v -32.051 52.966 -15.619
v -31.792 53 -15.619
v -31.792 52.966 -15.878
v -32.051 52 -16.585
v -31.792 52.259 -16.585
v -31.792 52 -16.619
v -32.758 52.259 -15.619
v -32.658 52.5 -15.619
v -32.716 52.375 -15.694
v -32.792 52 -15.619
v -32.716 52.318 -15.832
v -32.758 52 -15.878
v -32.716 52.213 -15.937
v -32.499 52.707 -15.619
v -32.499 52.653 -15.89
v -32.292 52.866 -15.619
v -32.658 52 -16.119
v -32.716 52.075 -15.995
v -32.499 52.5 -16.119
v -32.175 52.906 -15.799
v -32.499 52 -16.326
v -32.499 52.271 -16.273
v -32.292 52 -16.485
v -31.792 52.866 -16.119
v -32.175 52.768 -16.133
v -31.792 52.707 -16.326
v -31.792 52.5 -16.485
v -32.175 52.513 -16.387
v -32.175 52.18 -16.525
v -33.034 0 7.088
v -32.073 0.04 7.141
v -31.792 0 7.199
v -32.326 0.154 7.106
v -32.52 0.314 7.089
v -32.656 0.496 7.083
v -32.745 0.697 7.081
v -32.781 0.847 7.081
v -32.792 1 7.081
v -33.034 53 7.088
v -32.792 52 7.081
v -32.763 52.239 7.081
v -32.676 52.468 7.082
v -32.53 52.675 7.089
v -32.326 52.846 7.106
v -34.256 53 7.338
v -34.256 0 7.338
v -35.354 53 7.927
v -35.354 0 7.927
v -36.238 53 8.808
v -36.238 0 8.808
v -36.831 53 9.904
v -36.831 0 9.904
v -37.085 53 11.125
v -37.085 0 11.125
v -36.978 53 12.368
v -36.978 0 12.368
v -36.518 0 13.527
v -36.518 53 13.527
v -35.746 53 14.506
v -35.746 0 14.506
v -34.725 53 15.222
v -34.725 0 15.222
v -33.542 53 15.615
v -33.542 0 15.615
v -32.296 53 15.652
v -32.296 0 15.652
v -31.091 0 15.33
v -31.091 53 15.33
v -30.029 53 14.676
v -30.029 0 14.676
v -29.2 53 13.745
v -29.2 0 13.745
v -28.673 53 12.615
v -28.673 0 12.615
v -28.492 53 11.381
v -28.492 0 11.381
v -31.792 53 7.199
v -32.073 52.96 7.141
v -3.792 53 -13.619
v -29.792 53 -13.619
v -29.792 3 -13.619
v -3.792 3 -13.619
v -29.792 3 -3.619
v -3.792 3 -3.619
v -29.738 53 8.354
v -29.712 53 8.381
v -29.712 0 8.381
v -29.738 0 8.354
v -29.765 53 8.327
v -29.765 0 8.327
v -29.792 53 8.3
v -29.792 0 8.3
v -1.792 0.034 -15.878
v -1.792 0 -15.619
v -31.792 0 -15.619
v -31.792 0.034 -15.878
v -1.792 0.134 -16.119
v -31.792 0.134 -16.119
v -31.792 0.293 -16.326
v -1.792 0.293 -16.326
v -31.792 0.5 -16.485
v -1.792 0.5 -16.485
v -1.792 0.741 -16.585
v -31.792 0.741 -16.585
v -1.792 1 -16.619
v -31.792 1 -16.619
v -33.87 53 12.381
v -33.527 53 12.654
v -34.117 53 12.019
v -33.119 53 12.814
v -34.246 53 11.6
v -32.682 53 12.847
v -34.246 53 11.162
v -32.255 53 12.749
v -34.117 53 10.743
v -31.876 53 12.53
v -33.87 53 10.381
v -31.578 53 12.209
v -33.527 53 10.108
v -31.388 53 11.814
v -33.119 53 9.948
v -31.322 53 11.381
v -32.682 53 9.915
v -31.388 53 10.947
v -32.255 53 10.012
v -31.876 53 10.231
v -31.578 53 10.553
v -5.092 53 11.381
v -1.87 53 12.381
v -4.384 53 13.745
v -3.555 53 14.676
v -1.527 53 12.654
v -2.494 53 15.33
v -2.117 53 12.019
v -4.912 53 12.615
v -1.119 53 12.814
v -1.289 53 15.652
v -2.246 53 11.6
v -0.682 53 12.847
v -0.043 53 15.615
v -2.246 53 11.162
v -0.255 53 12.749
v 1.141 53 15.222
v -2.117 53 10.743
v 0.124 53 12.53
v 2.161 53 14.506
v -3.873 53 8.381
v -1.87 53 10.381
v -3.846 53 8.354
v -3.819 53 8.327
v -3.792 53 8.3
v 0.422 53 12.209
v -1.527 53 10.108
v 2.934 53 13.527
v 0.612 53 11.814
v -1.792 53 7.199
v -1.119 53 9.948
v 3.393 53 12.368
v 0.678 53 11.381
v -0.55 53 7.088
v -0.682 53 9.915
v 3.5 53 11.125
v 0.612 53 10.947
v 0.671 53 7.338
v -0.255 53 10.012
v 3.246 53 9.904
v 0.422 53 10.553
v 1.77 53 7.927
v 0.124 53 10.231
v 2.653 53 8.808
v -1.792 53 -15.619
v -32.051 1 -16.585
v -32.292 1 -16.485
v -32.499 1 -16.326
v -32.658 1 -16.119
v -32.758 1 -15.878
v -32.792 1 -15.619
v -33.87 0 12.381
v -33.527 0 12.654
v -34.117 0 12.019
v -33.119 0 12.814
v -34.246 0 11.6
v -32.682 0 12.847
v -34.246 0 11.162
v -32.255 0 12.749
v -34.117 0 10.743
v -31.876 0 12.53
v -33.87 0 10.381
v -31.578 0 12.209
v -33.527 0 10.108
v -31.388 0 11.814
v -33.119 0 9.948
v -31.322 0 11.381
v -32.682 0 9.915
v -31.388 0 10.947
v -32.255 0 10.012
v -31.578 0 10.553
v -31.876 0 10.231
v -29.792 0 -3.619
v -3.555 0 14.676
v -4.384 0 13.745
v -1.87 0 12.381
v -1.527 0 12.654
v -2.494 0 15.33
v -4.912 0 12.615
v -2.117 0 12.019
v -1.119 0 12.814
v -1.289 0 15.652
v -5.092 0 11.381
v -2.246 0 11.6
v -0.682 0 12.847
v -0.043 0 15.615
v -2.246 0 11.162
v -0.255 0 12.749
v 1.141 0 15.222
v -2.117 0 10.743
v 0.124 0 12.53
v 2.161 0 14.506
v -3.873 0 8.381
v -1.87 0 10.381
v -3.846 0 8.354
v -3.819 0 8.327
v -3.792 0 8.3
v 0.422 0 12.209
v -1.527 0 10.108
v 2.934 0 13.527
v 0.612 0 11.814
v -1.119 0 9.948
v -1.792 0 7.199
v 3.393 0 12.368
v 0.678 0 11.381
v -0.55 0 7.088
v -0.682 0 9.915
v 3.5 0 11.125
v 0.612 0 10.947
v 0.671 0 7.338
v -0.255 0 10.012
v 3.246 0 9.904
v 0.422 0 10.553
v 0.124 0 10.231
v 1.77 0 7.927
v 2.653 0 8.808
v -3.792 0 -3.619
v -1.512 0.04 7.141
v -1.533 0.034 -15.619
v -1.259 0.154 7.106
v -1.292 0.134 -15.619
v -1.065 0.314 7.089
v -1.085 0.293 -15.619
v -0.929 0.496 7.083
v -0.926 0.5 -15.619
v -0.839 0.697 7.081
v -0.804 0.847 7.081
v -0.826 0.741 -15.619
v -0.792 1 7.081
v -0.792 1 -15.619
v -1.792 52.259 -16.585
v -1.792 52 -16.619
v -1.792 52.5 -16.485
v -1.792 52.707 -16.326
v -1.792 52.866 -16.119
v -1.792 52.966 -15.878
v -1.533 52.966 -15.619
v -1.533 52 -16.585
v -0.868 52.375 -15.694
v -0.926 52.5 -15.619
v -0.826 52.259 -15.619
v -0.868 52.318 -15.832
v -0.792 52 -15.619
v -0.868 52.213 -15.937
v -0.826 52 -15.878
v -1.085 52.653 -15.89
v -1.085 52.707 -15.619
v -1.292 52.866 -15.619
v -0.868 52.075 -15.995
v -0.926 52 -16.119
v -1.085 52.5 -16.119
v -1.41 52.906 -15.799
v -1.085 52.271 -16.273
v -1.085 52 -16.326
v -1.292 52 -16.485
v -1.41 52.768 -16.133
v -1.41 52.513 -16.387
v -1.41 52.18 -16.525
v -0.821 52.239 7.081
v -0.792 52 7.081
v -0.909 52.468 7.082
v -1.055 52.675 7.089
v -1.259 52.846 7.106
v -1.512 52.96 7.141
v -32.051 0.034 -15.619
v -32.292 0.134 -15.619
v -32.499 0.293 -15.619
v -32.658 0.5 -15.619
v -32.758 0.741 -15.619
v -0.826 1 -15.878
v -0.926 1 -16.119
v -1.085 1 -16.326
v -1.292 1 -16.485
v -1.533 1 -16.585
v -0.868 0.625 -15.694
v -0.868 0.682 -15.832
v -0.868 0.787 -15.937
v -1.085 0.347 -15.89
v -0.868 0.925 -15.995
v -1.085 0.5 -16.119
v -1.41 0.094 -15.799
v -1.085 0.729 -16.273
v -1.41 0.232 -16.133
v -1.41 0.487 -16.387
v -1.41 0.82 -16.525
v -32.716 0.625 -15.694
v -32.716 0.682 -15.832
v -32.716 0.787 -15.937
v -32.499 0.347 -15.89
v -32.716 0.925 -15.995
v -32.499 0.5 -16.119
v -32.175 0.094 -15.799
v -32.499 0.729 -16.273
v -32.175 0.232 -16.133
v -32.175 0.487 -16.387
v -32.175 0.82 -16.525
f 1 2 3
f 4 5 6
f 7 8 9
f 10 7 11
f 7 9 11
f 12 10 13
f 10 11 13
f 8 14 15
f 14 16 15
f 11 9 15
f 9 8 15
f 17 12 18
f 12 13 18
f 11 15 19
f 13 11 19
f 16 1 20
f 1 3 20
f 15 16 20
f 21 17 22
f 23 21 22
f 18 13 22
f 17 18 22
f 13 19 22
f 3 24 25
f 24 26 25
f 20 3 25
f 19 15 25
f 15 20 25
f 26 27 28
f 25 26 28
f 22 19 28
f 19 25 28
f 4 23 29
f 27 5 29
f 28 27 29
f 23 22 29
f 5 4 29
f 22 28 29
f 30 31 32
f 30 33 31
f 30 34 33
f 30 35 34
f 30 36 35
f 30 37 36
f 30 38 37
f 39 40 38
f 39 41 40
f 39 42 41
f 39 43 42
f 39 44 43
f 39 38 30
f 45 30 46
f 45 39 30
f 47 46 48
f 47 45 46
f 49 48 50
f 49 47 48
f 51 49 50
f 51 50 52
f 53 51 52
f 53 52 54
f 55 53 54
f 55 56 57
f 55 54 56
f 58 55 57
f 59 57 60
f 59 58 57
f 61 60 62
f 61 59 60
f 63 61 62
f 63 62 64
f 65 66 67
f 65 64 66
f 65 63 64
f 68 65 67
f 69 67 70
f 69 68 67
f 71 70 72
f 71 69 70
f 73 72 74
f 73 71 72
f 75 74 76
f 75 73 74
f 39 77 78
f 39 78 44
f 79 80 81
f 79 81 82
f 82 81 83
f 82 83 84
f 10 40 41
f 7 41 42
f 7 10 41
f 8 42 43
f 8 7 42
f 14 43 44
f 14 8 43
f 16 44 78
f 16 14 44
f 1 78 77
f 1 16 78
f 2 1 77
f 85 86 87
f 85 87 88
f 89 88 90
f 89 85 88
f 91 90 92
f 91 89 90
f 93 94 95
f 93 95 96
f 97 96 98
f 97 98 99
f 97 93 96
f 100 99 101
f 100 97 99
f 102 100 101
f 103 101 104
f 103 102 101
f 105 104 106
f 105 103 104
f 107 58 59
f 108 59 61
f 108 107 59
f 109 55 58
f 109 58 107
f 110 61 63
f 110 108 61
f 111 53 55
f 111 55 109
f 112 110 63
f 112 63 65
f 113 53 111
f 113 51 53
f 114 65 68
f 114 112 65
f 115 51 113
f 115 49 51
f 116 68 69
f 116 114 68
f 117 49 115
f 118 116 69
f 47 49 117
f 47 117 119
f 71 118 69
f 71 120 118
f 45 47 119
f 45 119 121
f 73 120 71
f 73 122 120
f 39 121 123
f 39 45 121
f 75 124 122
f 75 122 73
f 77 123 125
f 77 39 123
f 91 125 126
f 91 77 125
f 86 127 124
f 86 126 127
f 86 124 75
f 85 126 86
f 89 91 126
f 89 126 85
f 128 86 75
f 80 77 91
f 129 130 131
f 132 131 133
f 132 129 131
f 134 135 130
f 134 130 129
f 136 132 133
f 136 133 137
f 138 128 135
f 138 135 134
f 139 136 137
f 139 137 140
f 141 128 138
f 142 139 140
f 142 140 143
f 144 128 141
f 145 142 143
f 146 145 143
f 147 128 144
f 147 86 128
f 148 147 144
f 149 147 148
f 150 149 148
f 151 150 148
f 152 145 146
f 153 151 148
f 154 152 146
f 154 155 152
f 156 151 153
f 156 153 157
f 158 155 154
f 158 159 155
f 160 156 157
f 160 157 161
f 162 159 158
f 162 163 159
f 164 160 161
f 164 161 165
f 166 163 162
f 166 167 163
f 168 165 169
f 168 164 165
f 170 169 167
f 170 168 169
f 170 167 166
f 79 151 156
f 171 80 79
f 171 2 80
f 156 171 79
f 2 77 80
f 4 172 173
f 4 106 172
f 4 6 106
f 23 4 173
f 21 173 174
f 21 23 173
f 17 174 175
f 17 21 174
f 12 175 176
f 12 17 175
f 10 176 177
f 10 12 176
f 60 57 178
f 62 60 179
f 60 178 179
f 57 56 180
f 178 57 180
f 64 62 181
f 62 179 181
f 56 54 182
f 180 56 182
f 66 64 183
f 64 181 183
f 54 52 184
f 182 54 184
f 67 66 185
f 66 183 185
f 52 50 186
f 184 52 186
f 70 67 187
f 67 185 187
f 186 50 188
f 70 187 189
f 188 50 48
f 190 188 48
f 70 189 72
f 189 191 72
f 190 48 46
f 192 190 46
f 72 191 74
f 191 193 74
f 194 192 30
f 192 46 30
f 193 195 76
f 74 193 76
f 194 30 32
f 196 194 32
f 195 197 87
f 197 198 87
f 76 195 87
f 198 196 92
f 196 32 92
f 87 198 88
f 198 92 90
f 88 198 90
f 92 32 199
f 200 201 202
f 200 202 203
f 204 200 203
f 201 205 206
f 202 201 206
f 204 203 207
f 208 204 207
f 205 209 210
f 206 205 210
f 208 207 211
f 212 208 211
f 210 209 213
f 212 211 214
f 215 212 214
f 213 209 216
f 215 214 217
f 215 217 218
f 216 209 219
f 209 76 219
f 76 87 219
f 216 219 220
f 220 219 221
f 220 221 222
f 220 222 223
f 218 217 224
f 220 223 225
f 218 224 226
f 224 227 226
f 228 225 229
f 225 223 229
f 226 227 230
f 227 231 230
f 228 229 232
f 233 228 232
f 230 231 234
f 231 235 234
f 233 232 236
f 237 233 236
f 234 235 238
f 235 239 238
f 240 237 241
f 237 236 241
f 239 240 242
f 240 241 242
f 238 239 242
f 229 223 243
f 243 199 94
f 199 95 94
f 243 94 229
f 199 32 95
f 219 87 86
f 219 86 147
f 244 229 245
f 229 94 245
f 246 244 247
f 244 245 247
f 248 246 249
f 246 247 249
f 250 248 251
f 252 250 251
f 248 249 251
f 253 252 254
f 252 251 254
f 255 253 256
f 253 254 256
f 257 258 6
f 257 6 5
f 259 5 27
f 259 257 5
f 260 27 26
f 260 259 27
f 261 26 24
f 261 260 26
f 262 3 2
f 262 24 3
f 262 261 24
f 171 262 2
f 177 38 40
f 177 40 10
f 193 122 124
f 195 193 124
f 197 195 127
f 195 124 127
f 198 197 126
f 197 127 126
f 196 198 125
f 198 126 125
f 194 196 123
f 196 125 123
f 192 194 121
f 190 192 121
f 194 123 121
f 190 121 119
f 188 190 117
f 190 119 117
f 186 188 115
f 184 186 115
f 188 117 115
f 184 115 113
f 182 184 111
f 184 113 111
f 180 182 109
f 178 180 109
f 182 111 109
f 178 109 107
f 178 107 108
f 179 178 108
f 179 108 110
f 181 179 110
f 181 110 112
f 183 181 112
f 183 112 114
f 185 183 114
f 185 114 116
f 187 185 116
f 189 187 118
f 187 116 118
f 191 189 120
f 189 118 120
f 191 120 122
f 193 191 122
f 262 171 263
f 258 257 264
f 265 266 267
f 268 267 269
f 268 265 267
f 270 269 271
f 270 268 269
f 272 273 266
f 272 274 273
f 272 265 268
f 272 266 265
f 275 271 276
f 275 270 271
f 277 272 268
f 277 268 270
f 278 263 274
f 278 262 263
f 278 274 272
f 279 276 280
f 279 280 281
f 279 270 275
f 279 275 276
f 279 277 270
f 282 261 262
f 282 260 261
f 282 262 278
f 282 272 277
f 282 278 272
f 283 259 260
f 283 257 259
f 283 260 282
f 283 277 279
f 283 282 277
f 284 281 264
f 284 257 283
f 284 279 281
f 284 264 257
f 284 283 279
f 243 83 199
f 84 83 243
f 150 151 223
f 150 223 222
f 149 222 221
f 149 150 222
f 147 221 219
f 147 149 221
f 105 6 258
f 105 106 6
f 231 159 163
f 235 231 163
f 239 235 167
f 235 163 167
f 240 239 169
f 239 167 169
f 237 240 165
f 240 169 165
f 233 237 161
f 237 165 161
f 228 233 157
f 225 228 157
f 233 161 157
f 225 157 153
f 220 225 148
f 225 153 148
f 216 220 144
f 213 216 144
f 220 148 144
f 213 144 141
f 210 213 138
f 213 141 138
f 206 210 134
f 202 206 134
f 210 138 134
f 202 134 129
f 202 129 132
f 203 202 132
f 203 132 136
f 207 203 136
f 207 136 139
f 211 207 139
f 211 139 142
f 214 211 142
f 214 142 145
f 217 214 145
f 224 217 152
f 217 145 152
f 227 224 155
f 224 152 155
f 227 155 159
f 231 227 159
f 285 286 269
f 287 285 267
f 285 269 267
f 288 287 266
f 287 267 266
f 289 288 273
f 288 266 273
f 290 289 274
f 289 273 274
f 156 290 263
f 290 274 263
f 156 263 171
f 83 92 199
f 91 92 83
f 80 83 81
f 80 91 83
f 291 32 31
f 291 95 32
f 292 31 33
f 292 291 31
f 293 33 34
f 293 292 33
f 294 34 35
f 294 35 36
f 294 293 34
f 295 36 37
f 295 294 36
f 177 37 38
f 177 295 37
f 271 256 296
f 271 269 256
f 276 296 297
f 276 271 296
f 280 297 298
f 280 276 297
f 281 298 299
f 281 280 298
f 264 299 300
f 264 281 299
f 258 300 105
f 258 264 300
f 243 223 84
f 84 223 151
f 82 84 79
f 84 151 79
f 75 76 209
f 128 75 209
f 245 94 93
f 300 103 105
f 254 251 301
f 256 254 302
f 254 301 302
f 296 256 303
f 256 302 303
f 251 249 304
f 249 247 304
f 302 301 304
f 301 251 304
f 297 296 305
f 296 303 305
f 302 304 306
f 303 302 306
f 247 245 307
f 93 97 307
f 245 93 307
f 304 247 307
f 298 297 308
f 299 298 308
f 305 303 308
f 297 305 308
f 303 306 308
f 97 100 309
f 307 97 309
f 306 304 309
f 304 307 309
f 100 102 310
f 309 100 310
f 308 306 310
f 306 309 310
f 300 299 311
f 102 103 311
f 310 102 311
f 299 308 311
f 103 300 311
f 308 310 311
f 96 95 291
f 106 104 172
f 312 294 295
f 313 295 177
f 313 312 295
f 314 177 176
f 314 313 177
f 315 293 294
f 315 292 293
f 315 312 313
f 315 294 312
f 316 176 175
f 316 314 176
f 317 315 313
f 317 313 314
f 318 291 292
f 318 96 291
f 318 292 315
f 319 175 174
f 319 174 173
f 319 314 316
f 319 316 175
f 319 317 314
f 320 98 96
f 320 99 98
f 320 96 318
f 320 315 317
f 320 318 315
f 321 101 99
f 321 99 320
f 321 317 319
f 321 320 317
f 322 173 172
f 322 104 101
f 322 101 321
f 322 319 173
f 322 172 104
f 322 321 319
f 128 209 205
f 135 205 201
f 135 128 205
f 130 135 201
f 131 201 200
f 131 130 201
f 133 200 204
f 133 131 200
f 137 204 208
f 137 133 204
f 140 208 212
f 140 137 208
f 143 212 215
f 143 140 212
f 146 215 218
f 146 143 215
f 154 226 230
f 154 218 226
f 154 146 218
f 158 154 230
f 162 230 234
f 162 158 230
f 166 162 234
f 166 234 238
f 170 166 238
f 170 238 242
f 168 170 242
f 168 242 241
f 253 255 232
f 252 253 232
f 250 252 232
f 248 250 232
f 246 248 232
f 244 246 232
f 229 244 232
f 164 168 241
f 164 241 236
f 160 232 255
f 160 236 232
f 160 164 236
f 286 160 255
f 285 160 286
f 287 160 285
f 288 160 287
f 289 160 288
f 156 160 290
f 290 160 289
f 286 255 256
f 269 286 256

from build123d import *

# Parameters (mm, degrees)
SKETCH1_W           = 32
SKETCH1_H           = 28
BOSS_EXTRUDE1_DEPTH = 53
SKETCH2_W           = 26
SKETCH2_H           = 22
CUT_EXTRUDE1_DEPTH  = 56
SKETCH9_R           = 4.3
BOSS_EXTRUDE5_DEPTH = 53
SKETCH10_R          = 1.47
CUT_EXTRUDE5_DEPTH  = 53
SKETCH11_R          = 4.3
BOSS_EXTRUDE6_DEPTH = 53
SKETCH12_W          = 26
SKETCH12_H          = 3
BOSS_EXTRUDE7_DEPTH = 10
SKETCH13_R          = 1.47
CUT_EXTRUDE6_DEPTH  = 53
FILLET1_R           = 1


with BuildPart() as part:
    # Sketch1 → Boss-Extrude1 (new body)
    with BuildSketch(Plane(origin=(0, 0, 0), x_dir=(1, 0, 0), z_dir=(0, 1, 0))):
        with Locations((-16.792307692, 2.619230769)):
            Rectangle(SKETCH1_W, SKETCH1_H)
    extrude(amount=BOSS_EXTRUDE1_DEPTH)

    # Sketch2 → Cut-Extrude1 (cut)
    with BuildSketch(Plane(origin=(0, 53, 0), x_dir=(1, 0, 0), z_dir=(0, 1, 0))):
        with Locations((-16.792307692, 2.619230769)):
            Rectangle(SKETCH2_W, SKETCH2_H)
    extrude(amount=-CUT_EXTRUDE1_DEPTH, mode=Mode.SUBTRACT)

    # Sketch9 → Boss-Extrude5 (add)
    with BuildSketch(Plane(origin=(0, 53, 0), x_dir=(1, 0, 0), z_dir=(0, 1, 0))):
        with Locations((-32.792307692, -11.380769231)):
            Circle(SKETCH9_R)
    extrude(amount=-BOSS_EXTRUDE5_DEPTH)

    # Sketch10 → Cut-Extrude5 (cut)
    with BuildSketch(Plane(origin=(0, 53, 0), x_dir=(1, 0, 0), z_dir=(0, 1, 0))):
        with Locations((-32.792307692, -11.380769231)):
            Circle(SKETCH10_R)
    extrude(amount=-CUT_EXTRUDE5_DEPTH, mode=Mode.SUBTRACT)

    # Sketch11 → Boss-Extrude6 (add)
    with BuildSketch(Plane(origin=(0, 53, 0), x_dir=(1, 0, 0), z_dir=(0, 1, 0))):
        with Locations((-0.792307692, -11.380769231)):
            Circle(SKETCH11_R)
    extrude(amount=-BOSS_EXTRUDE6_DEPTH)

    # Sketch12 → Boss-Extrude7 (add)
    with BuildSketch(Plane.XY.offset(-13.619230769)):
        with Locations((-16.792307692, 1.5)):
            Rectangle(SKETCH12_W, SKETCH12_H)
    extrude(amount=BOSS_EXTRUDE7_DEPTH)

    # Sketch13 → Cut-Extrude6 (cut)
    with BuildSketch(Plane(origin=(0, 53, 0), x_dir=(1, 0, 0), z_dir=(0, 1, 0))):
        with Locations((-0.792307692, -11.380769231)):
            Circle(SKETCH13_R)
    extrude(amount=-CUT_EXTRUDE6_DEPTH, mode=Mode.SUBTRACT)

    # Fillet1
    fillet1_edges = [part.edges().sort_by_distance(p)[0] for p in [
        (-16.792307692, 53, -16.619230769),
        (-32.792307692, 53, -4.769230769),
        (-16.792307692, 0, -16.619230769),
        (-32.792307692, 0, -4.769230769),
        (-0.792307692, 0, -4.769230769),
        (-0.792307692, 53, -4.769230769),
        (-32.792307692, 26.5, -16.619230769),
        (-0.792307692, 26.5, -16.619230769),
    ]]
    fillet(fillet1_edges, radius=FILLET1_R)


solid = part.part
